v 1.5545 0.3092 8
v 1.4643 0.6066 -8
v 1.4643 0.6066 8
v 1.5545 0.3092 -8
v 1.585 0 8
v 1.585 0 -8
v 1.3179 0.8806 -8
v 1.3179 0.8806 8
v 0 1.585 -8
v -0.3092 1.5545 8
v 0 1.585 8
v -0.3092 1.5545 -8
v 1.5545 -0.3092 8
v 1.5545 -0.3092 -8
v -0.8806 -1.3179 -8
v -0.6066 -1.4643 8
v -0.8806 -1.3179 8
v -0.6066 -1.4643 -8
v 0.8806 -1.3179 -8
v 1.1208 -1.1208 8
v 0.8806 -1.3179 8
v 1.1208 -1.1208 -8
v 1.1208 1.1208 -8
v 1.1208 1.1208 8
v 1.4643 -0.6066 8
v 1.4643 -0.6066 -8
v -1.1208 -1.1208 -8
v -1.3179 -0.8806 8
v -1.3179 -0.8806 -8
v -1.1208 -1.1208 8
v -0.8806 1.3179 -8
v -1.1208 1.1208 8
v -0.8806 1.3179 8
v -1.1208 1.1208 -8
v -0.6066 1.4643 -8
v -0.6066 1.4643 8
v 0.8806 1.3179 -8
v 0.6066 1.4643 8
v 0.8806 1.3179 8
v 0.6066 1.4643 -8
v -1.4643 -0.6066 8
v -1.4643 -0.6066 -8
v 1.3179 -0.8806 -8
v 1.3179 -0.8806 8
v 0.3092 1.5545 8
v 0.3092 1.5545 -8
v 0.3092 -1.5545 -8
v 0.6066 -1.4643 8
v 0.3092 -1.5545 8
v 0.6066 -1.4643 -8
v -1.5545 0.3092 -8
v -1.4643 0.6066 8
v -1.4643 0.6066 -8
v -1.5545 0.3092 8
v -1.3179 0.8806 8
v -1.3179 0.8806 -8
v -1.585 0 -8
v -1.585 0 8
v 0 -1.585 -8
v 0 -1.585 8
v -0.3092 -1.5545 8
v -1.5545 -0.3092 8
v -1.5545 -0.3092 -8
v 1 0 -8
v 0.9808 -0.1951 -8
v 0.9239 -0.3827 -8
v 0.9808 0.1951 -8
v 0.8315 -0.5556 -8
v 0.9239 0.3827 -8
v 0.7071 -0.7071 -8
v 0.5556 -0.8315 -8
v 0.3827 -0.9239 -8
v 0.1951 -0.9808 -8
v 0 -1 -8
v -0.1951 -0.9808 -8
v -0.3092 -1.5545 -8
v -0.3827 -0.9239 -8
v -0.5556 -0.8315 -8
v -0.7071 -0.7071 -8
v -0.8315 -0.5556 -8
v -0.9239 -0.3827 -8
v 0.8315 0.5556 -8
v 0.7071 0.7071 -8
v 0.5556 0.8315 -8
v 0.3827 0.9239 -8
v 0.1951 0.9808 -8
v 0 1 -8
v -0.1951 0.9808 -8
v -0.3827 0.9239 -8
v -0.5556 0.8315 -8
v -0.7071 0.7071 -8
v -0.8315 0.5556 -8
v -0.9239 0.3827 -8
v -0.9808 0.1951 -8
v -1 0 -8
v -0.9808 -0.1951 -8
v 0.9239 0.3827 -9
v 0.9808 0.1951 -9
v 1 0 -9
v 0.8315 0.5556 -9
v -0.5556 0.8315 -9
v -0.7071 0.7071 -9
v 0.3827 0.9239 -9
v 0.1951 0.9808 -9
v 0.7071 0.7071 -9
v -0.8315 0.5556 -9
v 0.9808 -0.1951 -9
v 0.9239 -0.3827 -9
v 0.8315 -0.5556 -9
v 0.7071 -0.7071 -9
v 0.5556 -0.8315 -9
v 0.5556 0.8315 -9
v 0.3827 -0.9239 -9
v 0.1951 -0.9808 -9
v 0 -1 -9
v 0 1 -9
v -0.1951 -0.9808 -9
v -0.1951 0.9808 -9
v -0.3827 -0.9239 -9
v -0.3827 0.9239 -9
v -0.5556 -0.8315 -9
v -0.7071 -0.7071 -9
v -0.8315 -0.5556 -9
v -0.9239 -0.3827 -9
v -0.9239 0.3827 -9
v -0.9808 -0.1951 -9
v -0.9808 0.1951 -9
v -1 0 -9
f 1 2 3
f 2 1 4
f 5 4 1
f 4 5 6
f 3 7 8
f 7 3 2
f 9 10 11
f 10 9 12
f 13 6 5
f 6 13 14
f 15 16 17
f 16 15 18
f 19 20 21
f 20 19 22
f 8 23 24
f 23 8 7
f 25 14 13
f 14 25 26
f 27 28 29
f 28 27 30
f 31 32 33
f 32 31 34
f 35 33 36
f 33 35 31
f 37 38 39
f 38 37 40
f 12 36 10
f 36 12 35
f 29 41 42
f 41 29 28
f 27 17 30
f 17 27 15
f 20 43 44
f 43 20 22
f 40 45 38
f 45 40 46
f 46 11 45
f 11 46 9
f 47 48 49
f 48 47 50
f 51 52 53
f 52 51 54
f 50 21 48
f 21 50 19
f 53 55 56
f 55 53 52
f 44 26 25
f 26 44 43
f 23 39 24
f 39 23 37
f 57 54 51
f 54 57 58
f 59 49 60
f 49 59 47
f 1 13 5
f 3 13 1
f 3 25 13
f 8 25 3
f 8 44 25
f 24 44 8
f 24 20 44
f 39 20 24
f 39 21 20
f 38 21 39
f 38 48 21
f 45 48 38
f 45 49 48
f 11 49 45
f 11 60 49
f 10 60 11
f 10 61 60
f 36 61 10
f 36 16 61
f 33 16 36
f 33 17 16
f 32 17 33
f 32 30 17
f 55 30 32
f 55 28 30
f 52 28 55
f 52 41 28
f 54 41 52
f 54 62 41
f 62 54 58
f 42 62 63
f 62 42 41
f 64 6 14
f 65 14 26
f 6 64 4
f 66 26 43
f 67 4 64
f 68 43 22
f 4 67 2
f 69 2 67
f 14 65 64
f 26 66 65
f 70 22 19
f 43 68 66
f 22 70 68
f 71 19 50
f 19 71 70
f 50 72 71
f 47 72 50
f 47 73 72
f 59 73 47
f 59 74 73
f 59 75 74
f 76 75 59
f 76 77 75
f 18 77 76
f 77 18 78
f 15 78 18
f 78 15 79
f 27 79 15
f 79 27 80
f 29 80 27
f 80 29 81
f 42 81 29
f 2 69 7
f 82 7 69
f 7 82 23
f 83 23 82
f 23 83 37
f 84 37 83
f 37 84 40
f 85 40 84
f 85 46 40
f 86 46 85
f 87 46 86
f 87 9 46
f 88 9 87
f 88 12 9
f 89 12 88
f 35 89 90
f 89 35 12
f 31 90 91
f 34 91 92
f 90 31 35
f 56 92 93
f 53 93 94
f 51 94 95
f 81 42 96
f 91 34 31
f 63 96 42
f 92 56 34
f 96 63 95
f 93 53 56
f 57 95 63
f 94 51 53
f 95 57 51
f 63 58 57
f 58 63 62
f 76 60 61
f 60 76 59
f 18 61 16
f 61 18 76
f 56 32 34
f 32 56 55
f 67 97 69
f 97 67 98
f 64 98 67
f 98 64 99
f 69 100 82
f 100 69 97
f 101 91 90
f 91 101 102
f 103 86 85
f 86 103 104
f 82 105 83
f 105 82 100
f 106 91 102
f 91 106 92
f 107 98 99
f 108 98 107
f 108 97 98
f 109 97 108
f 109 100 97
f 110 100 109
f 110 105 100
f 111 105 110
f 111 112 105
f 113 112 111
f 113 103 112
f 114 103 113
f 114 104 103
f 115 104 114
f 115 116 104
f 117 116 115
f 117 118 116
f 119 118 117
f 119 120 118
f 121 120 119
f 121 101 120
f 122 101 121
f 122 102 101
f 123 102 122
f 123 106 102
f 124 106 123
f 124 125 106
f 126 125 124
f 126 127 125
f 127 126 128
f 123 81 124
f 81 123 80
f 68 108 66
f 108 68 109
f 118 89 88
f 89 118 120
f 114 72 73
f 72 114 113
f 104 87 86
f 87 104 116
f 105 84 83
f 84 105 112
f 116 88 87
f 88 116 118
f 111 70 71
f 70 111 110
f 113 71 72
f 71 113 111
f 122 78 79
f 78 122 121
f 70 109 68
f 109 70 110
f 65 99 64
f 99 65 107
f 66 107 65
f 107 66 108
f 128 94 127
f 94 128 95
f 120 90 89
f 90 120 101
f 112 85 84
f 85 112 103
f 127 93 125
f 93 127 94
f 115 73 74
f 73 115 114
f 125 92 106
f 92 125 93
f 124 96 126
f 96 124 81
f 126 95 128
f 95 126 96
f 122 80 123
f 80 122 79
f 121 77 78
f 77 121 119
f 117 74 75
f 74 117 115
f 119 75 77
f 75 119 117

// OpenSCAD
// Parameters
overall_length_mm = 16; //[8:32:0.5]
outer_diameter_mm = 3.17; //[1.6:6.4:0.01]
thread_diameter_mm = 2; //[1:4:0.01]
thread_pitch_mm = 0.4; //[0.2:0.8:0.01]
thread_length_mm = 16; //[4:32:0.5]
thread_overlap_mm = 1; //[0.5:2:0.1]

// Standoff - complete geometry
module standoff() {
  color("Silver") {
    // Pillar body
    translate([0, 0, 0])
      cylinder(h=overall_length_mm, r=outer_diameter_mm/2, center=true, $fn=32);
  }
}

// Pillar - complete geometry
module pillar() {
  color("DimGray") {
    // Threaded feature
    translate([0, 0, (overall_length_mm/2 - thread_length_mm/2) - thread_overlap_mm])
      cylinder(h=thread_length_mm, r=thread_diameter_mm/2, center=true, $fn=32);
  }
}

// Assembly
module assembly() {
  union() {
    standoff();
    pillar();
  }
}

assembly();
